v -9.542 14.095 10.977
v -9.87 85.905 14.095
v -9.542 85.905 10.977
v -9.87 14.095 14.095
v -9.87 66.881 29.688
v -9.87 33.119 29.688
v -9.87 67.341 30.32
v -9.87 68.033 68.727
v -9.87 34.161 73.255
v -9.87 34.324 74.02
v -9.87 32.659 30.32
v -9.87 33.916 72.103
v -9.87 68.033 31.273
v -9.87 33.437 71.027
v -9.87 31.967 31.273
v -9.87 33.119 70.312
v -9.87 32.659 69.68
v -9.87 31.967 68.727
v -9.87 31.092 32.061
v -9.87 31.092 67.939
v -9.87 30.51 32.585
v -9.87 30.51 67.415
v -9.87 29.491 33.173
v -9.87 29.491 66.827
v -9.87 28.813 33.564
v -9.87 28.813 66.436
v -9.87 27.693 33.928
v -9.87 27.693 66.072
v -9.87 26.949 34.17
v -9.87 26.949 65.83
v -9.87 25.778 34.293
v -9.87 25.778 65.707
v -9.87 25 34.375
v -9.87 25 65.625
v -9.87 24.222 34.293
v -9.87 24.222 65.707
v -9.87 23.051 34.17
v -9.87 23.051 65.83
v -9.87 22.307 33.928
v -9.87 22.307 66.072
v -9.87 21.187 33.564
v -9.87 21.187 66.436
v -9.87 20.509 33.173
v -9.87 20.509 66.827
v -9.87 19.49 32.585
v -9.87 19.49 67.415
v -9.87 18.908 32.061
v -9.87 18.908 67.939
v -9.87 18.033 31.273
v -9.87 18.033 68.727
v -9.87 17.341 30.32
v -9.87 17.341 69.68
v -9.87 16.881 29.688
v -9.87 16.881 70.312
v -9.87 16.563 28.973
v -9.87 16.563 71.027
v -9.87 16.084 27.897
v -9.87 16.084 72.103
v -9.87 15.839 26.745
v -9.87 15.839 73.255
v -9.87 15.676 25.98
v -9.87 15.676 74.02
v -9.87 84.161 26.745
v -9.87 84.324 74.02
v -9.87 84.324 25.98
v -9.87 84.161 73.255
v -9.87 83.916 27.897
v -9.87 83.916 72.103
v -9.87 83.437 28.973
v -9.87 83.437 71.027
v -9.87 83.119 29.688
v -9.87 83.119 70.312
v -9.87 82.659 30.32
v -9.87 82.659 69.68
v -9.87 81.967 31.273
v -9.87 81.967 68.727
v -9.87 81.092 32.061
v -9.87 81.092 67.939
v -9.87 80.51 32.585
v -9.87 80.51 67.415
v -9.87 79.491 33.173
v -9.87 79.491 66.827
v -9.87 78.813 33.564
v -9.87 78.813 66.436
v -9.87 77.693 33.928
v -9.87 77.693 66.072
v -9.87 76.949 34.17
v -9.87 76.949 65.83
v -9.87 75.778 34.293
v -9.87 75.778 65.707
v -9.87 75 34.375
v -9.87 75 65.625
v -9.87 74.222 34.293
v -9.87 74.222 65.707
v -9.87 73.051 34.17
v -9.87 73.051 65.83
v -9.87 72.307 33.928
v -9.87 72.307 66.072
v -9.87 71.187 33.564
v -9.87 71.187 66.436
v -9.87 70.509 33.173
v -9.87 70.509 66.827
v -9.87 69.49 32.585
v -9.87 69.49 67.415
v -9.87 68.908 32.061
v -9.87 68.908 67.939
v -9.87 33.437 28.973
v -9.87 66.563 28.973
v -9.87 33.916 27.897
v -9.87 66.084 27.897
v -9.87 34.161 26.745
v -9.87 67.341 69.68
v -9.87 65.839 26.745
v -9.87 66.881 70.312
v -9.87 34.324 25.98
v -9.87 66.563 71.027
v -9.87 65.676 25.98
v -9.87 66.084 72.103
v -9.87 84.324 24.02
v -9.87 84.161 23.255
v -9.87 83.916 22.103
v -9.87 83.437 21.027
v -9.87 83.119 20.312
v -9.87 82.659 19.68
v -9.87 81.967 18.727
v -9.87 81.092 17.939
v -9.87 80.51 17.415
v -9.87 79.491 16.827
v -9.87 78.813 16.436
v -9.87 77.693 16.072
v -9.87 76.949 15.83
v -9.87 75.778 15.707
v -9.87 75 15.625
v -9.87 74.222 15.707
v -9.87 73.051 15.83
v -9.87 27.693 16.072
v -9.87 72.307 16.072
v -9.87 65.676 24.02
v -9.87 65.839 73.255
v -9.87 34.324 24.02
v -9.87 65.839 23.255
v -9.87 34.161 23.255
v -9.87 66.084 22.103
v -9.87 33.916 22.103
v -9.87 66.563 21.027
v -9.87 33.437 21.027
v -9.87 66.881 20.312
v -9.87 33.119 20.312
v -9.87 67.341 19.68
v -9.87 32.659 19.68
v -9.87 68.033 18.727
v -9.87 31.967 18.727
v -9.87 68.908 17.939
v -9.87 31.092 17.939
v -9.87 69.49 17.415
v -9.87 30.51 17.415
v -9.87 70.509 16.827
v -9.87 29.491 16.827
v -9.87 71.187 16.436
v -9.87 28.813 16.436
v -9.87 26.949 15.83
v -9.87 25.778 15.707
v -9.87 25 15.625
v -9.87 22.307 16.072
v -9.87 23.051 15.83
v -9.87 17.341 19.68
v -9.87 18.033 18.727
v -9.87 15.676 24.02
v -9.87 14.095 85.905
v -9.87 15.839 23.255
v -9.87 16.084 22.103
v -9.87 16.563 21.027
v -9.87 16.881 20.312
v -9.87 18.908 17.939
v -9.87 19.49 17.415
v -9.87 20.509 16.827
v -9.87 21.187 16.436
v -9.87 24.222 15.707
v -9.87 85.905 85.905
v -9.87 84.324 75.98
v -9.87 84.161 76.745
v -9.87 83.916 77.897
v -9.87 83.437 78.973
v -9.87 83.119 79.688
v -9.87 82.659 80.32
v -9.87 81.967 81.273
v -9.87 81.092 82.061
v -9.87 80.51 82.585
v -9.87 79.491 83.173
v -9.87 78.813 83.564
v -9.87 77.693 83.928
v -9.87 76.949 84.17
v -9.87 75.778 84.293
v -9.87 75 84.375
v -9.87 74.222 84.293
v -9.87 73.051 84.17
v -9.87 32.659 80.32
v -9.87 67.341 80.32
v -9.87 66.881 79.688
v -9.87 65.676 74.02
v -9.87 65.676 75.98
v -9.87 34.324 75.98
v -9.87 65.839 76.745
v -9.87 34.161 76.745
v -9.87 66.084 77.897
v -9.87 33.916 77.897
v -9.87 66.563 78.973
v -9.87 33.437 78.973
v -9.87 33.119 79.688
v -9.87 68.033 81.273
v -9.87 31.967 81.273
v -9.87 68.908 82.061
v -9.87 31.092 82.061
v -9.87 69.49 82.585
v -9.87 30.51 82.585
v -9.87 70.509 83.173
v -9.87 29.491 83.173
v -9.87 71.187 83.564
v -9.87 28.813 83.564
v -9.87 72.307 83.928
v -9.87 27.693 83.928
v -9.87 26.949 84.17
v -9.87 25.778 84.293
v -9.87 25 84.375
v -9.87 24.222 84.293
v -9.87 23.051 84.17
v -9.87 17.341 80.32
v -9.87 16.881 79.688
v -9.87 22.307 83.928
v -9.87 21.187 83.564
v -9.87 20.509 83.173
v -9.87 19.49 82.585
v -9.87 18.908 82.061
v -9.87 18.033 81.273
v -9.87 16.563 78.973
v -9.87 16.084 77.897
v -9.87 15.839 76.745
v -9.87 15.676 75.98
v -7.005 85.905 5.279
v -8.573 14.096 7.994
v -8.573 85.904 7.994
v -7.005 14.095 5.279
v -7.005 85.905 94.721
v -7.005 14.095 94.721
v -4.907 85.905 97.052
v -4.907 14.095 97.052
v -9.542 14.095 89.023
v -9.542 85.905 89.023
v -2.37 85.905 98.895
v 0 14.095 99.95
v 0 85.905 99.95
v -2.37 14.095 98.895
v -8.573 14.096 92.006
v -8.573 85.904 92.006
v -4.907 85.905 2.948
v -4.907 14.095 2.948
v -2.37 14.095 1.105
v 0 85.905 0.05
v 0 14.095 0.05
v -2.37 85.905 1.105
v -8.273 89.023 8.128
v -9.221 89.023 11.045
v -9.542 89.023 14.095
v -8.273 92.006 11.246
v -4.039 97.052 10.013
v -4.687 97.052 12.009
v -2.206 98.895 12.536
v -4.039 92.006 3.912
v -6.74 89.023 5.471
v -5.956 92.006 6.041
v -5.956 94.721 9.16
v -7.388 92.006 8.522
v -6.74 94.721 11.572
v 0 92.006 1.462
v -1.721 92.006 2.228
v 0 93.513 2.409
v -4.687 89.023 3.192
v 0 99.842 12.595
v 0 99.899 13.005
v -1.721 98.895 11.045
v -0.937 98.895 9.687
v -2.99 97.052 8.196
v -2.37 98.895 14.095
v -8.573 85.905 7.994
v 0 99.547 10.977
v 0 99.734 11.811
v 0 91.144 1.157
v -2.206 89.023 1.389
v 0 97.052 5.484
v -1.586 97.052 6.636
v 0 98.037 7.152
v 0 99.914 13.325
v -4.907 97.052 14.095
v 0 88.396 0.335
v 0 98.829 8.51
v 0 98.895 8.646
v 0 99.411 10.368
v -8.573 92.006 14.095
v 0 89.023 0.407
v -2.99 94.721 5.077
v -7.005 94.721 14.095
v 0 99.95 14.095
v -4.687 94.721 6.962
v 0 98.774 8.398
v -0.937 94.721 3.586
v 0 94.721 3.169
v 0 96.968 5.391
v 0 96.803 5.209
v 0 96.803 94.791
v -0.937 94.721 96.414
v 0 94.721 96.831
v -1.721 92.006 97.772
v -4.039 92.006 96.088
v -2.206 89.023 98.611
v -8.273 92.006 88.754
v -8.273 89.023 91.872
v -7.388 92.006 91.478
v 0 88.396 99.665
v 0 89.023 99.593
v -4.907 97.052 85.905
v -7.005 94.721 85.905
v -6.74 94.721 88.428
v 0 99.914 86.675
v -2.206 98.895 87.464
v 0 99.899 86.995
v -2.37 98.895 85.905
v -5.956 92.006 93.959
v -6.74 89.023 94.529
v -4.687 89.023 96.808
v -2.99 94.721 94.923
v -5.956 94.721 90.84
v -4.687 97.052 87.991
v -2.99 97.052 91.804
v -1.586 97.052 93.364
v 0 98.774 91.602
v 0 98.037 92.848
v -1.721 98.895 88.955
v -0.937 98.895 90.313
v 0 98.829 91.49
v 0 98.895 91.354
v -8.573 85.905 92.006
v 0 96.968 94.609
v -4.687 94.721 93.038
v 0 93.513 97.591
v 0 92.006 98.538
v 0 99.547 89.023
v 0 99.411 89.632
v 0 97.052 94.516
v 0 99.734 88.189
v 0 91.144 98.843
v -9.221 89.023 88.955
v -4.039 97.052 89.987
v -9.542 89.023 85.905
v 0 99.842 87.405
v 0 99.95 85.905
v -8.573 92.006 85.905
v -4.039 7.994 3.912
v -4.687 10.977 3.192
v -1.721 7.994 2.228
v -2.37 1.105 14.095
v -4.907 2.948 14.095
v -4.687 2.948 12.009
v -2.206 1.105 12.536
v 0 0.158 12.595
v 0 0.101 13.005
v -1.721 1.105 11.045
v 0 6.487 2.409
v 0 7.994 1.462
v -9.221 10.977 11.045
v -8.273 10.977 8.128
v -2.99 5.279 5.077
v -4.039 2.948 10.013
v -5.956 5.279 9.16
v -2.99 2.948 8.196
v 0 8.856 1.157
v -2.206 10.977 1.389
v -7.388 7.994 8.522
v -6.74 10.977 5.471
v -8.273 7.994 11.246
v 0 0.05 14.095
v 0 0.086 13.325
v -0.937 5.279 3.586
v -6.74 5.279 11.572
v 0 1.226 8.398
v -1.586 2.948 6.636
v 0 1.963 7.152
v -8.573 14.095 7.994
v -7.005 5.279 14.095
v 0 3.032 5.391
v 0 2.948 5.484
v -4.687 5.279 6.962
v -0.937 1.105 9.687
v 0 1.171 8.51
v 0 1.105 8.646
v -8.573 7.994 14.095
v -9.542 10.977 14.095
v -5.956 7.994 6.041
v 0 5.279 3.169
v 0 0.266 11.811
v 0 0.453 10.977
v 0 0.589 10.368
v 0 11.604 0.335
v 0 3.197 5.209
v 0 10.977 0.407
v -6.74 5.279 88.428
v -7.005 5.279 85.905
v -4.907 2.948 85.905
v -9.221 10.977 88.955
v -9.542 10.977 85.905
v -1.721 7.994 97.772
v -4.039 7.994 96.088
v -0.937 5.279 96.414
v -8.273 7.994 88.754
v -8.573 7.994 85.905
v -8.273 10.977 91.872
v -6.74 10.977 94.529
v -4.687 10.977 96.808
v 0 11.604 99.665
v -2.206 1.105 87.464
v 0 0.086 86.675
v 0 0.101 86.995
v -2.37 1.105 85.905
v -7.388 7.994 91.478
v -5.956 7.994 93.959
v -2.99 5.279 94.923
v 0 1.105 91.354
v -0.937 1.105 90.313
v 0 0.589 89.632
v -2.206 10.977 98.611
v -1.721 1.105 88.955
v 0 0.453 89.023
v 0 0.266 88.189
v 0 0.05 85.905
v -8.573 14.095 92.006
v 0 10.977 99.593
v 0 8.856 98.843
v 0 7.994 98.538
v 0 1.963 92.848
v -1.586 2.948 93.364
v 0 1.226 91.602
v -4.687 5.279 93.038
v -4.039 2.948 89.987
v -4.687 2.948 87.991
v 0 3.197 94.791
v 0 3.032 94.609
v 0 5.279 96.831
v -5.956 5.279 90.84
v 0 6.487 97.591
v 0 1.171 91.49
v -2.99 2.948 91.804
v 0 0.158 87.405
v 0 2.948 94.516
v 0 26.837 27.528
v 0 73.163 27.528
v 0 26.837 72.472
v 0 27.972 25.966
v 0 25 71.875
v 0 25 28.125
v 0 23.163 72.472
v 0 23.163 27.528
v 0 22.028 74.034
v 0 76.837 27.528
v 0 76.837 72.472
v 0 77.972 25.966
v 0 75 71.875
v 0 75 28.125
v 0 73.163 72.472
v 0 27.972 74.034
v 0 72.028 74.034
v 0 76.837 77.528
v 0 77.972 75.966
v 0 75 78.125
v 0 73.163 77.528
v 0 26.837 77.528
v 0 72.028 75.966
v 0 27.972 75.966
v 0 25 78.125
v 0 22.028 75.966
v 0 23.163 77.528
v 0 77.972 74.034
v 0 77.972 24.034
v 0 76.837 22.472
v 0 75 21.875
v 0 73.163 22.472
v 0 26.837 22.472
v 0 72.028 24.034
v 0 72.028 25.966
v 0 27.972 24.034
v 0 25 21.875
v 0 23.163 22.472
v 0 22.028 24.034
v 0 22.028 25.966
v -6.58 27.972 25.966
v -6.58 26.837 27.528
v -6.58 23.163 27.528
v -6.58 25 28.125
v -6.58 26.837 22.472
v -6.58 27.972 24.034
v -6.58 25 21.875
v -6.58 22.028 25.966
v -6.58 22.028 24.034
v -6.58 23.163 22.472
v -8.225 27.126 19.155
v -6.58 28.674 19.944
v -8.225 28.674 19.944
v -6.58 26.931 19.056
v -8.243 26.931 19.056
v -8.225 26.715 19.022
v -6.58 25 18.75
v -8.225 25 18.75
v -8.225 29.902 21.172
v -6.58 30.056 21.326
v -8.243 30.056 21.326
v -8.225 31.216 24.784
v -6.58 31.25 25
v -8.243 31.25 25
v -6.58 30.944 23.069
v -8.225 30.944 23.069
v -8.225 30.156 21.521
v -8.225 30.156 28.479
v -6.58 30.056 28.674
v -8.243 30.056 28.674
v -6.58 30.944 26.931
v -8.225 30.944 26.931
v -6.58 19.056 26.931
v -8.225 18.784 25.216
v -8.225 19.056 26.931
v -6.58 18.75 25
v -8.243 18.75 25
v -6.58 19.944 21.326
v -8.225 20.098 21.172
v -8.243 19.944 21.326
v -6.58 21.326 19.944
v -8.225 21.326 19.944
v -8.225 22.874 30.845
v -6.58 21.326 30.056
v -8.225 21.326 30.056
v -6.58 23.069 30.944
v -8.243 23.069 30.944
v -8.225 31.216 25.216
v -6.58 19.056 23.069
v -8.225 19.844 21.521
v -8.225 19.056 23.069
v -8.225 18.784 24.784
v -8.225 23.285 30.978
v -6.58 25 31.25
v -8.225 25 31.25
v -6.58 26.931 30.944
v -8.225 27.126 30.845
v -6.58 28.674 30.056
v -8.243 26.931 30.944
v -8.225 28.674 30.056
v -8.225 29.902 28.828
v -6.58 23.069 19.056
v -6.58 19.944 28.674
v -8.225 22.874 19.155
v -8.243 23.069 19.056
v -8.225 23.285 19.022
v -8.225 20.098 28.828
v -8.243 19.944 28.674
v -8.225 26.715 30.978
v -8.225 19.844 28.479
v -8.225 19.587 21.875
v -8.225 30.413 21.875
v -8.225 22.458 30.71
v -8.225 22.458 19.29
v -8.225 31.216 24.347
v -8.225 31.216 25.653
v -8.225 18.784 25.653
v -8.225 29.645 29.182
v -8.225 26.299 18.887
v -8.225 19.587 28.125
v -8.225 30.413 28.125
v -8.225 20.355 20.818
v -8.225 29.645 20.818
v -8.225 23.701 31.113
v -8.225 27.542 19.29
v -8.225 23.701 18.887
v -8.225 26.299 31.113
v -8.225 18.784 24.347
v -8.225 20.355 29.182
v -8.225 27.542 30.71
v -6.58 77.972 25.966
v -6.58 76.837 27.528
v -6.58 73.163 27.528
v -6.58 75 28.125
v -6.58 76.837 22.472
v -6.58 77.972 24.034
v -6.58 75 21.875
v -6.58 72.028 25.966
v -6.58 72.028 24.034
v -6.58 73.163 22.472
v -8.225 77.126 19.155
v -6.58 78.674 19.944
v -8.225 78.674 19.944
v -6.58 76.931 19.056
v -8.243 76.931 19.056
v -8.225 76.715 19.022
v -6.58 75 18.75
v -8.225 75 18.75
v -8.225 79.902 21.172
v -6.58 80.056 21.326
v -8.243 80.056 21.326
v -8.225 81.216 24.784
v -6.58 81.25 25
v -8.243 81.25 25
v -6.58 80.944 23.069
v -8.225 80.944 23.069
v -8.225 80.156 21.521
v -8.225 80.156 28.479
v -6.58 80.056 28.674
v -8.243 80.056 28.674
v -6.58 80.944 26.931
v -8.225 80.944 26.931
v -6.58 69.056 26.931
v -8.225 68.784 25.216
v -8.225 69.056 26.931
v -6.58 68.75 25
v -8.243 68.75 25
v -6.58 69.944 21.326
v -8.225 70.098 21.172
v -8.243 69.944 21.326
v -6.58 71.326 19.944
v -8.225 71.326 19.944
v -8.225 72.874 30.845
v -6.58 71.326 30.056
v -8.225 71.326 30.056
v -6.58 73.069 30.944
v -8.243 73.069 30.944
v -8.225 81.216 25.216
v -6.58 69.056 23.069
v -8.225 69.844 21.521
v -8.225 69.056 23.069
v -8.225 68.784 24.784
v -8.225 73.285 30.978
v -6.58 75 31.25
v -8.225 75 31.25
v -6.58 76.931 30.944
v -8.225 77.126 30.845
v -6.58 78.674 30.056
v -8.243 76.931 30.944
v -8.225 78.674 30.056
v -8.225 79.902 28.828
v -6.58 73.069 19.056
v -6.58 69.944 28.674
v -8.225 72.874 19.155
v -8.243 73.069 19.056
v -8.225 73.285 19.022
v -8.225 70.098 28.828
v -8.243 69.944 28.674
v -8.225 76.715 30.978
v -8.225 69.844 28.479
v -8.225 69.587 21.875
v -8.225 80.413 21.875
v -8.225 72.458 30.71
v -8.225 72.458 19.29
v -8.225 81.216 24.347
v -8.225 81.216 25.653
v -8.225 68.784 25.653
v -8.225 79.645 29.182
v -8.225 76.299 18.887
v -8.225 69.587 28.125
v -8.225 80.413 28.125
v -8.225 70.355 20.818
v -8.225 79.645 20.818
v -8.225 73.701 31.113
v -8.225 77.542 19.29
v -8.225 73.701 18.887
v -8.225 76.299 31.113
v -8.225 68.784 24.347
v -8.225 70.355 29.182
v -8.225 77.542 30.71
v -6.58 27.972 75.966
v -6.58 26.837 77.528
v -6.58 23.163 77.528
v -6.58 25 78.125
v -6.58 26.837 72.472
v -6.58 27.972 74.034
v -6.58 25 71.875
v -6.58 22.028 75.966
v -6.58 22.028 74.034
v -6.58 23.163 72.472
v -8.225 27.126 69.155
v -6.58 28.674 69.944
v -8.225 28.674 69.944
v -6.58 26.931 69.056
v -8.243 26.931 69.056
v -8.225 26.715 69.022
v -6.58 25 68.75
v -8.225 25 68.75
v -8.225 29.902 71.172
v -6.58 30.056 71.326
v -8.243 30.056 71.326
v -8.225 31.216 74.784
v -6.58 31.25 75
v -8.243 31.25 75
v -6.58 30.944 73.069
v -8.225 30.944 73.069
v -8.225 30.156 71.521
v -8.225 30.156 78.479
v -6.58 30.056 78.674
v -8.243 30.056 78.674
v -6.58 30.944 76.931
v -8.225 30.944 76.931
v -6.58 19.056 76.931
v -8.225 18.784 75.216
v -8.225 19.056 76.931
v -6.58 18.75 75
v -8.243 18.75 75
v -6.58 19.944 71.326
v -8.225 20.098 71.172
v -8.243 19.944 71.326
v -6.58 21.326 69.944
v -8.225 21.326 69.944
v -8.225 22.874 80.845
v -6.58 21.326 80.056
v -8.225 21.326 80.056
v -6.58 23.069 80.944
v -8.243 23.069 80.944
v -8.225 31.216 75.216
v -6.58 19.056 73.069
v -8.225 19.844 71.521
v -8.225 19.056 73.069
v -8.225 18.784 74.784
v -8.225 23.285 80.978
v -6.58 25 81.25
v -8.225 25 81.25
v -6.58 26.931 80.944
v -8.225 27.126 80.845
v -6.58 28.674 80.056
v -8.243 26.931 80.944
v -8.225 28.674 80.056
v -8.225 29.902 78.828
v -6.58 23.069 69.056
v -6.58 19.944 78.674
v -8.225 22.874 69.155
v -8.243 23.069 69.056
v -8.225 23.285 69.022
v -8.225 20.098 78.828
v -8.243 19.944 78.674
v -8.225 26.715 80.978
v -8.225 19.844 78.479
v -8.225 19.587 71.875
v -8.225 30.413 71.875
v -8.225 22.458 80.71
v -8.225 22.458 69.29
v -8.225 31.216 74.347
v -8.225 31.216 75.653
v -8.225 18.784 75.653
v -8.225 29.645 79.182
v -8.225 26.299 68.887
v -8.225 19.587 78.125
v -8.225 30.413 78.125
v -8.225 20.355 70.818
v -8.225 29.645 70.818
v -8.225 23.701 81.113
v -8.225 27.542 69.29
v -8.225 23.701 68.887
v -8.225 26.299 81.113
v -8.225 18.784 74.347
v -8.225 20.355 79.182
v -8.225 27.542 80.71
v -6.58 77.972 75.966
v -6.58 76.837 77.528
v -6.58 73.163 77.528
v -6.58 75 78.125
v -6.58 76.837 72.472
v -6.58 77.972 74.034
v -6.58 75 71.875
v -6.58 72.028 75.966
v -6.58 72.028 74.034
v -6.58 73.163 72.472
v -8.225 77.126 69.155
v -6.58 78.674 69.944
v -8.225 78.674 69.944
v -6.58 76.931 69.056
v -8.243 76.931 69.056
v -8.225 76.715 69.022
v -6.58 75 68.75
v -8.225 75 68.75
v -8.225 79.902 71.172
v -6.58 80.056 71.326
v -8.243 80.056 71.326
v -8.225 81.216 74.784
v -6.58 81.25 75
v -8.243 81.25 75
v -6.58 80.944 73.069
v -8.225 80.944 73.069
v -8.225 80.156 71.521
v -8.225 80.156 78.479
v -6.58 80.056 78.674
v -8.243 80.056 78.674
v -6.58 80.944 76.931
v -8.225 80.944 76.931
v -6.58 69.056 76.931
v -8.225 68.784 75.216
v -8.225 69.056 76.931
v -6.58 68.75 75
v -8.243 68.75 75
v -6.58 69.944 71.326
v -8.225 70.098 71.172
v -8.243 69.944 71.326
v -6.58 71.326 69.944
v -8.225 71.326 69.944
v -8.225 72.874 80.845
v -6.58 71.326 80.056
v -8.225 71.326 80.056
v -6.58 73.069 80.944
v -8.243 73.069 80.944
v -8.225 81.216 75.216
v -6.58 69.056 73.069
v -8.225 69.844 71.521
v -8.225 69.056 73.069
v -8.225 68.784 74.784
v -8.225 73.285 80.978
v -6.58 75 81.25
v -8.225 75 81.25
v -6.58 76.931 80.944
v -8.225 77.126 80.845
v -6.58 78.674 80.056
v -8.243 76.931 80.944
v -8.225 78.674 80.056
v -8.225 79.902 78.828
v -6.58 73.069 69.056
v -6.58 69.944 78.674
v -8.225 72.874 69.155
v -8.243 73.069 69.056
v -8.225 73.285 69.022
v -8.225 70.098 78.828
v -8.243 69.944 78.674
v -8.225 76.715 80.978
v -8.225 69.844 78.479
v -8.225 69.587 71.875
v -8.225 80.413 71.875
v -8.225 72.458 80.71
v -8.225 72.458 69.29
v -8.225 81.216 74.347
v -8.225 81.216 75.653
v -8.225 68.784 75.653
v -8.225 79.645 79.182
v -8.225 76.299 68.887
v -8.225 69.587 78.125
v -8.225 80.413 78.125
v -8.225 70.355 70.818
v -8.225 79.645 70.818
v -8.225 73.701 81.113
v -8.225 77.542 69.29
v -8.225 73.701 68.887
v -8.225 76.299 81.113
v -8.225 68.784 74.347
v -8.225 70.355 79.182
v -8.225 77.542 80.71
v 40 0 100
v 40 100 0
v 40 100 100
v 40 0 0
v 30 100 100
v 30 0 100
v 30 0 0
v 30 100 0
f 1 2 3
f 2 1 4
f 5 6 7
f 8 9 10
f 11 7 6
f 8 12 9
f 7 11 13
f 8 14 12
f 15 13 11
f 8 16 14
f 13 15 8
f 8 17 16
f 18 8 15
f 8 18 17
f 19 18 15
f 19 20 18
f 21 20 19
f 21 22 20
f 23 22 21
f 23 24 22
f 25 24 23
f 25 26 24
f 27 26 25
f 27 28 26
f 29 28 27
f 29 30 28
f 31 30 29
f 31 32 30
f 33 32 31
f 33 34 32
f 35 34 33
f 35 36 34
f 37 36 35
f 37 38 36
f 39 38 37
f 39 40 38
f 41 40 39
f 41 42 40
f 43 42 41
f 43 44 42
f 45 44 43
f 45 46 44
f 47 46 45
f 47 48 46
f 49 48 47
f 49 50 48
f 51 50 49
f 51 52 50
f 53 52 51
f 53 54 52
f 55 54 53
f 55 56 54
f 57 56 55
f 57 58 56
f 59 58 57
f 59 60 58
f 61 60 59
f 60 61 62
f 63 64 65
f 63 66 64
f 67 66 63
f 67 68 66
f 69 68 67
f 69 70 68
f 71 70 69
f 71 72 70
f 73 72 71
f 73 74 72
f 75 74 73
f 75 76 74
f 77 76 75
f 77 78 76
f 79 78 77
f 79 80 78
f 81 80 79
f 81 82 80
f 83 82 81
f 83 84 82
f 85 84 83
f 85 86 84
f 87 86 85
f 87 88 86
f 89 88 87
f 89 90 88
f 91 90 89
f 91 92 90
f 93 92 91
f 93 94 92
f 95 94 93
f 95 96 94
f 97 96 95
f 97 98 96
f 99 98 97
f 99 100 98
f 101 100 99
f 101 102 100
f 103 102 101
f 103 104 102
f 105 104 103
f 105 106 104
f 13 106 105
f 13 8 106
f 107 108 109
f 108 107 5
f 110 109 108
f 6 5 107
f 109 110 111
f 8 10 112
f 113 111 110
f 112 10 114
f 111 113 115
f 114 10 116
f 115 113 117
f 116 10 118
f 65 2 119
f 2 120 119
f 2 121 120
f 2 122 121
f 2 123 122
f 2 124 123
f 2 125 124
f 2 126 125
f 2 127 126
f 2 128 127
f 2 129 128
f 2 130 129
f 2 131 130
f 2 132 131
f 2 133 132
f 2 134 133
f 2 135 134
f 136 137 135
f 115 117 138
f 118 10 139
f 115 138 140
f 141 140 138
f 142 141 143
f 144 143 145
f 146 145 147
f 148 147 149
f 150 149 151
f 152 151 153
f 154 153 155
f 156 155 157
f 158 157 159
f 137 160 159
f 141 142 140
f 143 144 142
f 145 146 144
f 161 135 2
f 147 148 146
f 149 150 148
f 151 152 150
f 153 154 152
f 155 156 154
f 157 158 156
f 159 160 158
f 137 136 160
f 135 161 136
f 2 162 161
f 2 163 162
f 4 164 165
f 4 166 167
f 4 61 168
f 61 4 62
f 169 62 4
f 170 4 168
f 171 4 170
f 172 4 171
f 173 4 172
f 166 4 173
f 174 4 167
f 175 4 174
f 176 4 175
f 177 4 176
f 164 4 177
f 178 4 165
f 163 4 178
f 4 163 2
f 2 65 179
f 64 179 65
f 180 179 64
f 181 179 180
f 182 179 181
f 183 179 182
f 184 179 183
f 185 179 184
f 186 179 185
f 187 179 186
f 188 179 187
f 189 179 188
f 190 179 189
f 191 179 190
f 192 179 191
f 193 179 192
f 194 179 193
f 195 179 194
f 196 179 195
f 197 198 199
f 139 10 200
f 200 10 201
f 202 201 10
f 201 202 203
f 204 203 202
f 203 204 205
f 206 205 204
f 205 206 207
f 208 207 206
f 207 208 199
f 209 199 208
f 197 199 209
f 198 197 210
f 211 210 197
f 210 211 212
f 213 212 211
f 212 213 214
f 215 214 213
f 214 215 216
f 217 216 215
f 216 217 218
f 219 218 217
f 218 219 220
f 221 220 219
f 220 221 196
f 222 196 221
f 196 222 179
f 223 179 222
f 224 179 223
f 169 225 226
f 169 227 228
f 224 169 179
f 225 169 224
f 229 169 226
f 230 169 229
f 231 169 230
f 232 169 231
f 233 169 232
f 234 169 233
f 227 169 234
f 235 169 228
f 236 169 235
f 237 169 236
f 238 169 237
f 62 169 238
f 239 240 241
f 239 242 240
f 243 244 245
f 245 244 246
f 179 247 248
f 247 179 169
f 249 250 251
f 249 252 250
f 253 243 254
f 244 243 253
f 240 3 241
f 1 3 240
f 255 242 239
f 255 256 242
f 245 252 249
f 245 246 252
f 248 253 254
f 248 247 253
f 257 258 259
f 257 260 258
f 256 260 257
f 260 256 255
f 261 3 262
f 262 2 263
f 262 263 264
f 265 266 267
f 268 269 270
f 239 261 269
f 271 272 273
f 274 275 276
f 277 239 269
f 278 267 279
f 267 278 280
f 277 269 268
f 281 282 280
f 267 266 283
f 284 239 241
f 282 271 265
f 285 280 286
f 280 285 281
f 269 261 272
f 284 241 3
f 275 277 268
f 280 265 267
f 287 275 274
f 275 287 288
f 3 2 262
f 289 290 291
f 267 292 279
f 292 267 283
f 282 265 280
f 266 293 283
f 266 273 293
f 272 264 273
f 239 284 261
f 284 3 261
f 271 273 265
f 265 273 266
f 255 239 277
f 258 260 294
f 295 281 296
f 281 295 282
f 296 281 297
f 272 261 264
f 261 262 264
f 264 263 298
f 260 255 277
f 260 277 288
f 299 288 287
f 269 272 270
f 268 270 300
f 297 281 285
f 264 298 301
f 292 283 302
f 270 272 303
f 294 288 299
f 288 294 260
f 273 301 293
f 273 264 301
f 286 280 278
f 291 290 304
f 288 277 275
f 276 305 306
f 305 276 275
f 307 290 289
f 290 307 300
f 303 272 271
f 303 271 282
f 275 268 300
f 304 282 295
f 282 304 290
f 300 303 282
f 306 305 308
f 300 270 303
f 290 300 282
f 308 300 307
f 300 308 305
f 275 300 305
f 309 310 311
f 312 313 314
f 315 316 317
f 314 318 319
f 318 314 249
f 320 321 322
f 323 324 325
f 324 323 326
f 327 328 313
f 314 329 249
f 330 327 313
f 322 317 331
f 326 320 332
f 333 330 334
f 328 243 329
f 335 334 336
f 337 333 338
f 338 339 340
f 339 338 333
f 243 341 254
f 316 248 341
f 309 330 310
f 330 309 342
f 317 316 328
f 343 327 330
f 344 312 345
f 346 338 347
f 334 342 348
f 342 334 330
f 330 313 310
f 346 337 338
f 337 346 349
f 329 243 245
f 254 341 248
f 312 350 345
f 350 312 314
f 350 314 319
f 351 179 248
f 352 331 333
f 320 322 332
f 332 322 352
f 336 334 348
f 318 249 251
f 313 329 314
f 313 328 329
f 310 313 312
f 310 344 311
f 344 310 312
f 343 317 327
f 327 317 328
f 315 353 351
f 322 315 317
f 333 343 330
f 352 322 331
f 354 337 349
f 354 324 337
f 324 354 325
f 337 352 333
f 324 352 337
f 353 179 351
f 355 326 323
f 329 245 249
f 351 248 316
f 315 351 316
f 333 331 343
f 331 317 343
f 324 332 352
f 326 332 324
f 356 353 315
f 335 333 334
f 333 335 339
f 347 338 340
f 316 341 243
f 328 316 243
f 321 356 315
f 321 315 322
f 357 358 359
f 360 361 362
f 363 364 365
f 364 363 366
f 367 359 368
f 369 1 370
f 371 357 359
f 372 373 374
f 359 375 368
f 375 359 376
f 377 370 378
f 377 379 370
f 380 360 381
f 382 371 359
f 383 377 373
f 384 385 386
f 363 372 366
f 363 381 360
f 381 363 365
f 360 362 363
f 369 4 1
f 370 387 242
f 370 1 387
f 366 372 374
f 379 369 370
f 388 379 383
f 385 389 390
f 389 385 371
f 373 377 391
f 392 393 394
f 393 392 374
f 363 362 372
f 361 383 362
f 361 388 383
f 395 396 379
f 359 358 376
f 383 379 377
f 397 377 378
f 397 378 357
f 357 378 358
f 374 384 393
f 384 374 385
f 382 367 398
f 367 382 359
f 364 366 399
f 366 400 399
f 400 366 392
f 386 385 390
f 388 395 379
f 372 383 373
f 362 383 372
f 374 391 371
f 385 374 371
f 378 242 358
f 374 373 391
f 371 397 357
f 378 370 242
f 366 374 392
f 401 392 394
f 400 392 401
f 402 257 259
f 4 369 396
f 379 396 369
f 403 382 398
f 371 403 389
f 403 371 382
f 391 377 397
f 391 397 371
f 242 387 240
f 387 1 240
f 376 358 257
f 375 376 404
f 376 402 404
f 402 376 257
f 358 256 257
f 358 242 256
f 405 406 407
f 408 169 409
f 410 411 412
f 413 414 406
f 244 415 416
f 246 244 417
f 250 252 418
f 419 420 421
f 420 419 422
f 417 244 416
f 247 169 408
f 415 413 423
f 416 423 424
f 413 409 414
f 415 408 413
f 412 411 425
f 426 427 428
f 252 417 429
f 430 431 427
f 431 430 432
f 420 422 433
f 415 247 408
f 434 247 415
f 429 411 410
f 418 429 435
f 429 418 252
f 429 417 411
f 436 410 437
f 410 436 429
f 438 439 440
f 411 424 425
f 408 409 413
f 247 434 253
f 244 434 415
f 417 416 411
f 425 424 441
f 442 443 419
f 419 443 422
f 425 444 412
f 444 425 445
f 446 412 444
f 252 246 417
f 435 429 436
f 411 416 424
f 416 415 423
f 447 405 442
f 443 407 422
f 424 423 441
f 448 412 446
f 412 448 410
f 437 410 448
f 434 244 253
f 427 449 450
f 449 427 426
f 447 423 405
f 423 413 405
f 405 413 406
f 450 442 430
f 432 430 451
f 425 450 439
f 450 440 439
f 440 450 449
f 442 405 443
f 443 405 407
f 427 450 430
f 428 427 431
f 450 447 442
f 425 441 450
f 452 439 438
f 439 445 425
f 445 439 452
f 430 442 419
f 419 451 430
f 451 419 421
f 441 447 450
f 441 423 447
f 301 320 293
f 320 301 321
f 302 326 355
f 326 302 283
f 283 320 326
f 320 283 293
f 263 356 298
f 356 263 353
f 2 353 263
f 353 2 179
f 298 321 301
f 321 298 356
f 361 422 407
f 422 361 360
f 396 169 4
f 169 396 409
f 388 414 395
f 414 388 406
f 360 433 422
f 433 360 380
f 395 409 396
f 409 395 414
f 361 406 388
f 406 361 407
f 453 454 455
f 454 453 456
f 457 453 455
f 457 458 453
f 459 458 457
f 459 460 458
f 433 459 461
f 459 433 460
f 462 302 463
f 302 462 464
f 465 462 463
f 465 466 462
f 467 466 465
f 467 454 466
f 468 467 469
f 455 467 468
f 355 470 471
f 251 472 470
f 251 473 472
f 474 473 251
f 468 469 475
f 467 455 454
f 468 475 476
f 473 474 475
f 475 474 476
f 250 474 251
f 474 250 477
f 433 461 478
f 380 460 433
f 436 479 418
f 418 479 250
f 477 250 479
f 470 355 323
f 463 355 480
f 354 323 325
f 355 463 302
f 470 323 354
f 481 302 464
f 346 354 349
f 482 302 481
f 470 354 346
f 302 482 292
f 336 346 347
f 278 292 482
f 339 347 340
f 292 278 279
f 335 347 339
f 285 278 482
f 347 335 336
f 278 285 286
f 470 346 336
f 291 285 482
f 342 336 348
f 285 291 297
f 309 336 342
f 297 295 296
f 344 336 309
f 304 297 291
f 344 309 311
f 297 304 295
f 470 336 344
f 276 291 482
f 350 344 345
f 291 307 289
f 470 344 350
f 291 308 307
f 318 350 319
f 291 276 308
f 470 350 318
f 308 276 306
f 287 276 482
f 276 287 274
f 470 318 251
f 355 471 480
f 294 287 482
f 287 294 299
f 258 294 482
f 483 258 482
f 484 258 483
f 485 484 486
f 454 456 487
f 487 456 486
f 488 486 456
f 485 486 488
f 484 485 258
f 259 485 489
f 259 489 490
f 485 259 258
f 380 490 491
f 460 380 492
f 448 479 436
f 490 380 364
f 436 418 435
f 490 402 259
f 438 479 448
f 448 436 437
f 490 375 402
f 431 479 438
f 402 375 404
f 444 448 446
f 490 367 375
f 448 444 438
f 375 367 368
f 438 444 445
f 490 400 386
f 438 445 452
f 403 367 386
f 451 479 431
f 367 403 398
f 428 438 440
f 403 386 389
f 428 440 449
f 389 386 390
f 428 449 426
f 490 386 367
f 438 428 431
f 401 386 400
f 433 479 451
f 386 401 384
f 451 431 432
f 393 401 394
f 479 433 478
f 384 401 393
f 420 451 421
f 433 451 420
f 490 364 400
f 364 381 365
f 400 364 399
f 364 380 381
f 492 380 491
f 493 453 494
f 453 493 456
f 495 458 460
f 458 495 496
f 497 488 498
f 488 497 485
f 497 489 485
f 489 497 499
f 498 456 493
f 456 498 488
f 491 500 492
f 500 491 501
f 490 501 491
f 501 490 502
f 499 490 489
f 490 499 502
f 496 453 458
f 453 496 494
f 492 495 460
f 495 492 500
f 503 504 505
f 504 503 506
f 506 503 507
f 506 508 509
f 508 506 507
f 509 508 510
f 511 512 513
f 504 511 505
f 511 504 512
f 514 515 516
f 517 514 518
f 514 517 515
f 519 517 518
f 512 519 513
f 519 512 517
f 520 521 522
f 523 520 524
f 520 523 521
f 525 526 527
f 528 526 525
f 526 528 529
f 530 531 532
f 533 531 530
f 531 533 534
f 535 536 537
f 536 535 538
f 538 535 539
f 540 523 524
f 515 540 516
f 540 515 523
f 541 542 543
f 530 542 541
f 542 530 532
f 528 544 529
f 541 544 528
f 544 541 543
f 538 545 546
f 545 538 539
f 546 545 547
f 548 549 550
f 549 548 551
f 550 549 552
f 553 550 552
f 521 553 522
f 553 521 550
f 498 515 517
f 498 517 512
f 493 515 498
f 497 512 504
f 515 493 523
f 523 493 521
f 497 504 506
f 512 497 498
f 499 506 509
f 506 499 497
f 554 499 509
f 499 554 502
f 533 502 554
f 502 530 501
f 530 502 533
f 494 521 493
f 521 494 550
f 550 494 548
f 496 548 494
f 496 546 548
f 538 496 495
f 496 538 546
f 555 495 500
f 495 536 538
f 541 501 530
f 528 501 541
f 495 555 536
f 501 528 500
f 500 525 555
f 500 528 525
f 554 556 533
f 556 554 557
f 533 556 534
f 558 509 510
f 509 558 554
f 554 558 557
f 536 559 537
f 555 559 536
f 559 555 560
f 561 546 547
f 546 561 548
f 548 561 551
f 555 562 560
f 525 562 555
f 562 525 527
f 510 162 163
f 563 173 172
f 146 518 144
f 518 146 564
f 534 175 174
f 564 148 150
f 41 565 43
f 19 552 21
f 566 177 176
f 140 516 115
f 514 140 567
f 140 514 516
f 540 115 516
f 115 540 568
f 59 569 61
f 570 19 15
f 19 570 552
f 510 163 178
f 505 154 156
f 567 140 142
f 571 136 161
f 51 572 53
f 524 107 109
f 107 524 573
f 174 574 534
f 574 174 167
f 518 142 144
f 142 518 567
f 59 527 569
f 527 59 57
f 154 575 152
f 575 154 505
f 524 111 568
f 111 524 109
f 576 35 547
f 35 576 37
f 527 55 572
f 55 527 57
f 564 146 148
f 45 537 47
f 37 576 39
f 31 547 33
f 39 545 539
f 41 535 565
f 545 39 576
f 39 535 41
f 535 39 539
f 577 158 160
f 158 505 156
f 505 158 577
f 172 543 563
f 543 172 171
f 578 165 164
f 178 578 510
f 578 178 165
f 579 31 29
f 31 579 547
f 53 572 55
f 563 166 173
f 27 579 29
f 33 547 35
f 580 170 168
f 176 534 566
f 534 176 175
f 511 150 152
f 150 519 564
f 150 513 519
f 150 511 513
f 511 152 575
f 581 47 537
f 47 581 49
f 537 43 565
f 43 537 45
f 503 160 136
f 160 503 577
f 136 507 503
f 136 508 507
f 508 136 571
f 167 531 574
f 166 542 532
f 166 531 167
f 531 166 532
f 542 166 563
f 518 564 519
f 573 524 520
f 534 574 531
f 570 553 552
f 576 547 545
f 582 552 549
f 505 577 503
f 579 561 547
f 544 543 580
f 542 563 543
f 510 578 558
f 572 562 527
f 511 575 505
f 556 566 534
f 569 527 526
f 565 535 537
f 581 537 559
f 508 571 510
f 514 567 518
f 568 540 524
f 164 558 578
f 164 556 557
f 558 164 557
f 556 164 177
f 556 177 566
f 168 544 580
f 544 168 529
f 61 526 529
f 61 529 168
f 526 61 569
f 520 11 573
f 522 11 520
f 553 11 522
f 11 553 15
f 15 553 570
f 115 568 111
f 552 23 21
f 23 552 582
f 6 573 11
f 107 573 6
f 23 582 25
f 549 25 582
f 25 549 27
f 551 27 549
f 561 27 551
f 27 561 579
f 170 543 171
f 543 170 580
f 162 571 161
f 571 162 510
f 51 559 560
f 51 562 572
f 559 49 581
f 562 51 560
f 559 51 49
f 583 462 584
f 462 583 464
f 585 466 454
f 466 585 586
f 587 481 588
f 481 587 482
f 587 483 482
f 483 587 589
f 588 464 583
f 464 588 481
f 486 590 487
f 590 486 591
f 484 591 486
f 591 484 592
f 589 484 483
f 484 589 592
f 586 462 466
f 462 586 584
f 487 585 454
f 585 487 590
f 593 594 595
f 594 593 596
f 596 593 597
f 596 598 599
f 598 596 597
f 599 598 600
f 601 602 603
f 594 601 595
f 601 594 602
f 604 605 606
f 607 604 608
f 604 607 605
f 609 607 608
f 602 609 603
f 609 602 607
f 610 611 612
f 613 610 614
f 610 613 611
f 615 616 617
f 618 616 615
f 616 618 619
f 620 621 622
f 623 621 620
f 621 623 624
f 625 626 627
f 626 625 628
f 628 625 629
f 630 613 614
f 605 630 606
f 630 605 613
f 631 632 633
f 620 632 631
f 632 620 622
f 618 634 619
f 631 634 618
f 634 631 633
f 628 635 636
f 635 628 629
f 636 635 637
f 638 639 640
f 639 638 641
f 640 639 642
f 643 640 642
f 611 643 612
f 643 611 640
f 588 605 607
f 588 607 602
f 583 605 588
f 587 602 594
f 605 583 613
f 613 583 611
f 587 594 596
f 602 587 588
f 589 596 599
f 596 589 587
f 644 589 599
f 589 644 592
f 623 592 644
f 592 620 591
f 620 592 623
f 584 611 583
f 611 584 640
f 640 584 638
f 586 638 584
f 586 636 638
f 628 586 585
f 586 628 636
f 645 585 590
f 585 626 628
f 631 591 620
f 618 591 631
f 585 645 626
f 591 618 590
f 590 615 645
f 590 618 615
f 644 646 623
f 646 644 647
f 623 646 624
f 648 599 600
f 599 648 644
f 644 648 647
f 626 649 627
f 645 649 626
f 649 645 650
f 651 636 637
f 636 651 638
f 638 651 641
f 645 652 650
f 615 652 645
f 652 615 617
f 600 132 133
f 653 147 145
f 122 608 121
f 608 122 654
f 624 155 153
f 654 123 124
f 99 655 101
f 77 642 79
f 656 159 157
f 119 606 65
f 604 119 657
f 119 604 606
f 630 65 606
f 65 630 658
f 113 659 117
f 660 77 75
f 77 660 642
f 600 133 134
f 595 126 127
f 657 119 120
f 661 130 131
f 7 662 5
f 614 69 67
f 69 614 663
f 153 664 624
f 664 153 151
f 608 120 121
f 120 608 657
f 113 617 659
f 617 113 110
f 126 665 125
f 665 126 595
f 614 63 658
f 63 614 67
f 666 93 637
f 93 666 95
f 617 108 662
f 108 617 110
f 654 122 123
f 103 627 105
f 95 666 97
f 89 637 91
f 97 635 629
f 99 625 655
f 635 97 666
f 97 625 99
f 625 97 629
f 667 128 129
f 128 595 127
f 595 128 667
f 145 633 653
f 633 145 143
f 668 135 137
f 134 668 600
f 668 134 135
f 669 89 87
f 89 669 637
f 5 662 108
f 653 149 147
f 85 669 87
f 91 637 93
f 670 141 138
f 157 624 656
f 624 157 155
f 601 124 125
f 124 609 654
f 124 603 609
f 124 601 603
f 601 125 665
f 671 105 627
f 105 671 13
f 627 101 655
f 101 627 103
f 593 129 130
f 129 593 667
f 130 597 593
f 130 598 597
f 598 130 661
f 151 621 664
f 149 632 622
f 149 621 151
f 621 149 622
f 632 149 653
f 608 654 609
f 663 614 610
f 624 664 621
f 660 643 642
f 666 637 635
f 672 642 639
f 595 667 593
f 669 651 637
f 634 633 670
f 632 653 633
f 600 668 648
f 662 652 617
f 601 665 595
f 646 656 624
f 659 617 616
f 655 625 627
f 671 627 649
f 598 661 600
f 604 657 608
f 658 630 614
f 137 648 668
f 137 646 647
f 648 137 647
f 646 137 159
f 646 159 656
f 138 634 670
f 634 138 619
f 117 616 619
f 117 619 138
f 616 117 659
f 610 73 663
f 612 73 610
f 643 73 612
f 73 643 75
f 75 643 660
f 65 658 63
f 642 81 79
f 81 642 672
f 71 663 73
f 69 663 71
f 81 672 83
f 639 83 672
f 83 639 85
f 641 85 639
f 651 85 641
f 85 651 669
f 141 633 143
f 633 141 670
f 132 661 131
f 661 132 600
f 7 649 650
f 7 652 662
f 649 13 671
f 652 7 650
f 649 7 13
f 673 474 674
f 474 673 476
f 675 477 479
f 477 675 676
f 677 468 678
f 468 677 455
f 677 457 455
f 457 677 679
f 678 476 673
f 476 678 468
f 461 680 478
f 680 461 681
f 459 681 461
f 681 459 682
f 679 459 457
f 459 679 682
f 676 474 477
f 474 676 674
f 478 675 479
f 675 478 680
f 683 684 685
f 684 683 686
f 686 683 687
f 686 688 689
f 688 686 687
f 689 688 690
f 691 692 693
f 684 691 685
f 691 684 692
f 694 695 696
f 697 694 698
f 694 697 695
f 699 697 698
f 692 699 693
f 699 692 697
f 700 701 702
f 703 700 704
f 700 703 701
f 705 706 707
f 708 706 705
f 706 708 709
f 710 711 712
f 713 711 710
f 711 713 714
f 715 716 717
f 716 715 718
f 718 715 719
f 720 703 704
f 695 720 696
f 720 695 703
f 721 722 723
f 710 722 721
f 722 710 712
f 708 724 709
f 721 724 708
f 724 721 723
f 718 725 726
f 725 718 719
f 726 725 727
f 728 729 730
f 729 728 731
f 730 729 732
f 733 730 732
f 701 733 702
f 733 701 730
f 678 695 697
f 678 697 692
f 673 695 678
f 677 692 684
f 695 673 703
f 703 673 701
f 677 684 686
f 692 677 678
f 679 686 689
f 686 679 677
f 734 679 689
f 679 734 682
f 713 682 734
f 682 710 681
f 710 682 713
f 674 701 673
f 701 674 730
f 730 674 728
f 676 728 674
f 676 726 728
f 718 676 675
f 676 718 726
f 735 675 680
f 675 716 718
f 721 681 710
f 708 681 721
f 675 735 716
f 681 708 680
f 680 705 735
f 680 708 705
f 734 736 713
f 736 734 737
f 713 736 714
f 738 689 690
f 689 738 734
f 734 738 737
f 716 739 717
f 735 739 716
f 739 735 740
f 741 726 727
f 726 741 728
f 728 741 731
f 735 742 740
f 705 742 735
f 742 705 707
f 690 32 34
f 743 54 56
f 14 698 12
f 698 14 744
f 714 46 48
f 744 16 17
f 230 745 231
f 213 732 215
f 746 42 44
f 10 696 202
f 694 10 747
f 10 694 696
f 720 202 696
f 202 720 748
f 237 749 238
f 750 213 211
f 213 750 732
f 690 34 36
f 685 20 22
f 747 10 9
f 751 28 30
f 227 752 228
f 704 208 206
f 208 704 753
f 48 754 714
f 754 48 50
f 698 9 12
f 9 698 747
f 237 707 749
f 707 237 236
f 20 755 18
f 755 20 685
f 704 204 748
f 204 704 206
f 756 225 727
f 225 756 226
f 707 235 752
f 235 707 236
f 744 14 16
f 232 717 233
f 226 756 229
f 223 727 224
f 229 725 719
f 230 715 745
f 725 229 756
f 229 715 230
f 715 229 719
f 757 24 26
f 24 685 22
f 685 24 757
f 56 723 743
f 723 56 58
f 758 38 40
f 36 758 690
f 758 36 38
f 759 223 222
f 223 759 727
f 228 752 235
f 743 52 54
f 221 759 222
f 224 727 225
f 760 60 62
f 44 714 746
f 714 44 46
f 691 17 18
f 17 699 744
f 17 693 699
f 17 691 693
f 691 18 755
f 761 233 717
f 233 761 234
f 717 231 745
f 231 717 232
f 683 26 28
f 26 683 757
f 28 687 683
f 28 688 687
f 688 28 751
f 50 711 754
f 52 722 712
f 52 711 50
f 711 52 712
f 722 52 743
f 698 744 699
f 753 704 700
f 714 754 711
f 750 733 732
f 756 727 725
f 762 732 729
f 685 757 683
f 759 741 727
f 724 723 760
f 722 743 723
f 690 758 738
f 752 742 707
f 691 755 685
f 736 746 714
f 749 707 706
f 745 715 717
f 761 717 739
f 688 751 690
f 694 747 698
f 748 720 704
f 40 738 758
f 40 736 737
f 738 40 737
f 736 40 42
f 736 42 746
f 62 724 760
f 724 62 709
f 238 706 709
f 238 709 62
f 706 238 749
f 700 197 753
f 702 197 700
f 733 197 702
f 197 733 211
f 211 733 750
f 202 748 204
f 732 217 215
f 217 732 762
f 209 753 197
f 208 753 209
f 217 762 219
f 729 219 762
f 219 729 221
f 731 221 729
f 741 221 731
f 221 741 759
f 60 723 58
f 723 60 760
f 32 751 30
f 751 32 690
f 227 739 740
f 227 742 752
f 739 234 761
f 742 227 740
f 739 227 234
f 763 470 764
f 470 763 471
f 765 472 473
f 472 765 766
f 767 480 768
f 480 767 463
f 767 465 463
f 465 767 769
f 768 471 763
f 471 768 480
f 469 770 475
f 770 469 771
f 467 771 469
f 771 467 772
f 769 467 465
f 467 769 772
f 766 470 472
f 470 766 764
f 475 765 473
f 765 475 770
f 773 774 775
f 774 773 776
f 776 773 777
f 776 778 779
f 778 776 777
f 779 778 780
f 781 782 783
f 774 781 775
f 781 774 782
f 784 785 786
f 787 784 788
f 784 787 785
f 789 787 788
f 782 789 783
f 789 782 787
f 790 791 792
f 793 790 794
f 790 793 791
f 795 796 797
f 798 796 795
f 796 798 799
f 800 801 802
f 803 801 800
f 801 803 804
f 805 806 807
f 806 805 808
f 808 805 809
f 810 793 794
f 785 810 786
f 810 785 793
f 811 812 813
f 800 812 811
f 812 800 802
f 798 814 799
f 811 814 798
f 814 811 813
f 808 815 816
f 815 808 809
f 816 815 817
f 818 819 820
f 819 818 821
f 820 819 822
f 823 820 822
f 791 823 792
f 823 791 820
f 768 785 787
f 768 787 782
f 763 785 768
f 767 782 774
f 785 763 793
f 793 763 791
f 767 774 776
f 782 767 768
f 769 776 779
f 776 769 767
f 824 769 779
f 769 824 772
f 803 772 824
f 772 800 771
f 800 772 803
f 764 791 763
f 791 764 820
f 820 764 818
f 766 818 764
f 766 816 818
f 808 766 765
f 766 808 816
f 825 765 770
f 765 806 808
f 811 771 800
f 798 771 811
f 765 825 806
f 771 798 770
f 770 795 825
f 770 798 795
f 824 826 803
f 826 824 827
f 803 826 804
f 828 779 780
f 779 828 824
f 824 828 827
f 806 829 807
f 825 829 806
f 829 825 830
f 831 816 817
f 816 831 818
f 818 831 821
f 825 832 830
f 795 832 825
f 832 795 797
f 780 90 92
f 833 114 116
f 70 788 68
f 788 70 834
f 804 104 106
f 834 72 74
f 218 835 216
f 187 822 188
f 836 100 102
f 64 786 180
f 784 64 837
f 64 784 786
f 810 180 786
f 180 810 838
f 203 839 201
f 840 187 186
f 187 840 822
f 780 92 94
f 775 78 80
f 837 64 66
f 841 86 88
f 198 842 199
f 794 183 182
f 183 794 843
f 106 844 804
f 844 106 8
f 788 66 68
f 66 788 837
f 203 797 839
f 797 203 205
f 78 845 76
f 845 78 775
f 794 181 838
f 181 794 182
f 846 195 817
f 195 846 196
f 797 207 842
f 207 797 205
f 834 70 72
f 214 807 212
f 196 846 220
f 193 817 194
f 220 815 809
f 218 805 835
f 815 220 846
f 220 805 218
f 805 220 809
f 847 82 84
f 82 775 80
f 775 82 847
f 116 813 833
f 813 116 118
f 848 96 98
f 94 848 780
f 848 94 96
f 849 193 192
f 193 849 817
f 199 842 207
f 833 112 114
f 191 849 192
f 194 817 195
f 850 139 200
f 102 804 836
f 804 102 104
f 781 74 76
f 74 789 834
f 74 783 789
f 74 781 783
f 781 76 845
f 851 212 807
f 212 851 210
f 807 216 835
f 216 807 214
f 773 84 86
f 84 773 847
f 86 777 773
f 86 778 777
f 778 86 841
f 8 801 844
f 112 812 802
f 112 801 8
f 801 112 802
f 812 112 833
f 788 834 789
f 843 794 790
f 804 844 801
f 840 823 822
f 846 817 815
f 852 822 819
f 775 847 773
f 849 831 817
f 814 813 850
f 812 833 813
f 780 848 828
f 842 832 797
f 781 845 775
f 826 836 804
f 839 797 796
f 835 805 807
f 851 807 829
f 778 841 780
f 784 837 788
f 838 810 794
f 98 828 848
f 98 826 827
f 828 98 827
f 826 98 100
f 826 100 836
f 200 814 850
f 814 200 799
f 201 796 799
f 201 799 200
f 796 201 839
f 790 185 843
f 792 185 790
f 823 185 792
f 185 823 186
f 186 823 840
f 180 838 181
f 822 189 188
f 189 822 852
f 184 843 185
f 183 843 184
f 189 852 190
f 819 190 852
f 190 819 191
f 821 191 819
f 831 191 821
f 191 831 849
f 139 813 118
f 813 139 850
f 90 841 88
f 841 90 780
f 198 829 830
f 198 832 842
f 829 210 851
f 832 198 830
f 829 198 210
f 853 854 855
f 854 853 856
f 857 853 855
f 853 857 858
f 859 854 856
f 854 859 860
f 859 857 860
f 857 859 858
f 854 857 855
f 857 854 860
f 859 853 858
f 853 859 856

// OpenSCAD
//
//  Copyright (C) 15-2-2013 Jasper den Ouden.
//
//  This is free software: you can redistribute it and/or modify
//  it under the terms of the GNU General Public License as published
//  by the Free Software Foundation, either version 3 of the License, or
//  (at your option) any later version.
//

// Rounded plate, for instance for reinforcement on other side if the wall is thin.

h = 100;
w = 2*50;

//TODO feh doesnt seem easily solvable to get some angle _and_ some thickness at same time.
//t = 15;

r = 15; //Rounding radius.

corner_d = w/4;

a = 70; //Angle the sides 'hit' the end.

ox = r*cos(a);
oy = r*sin(a);

t= r - ox;

hole_r = w/32;
head_r = w/16; //Radius of screw(or whatever) head.
head_d = t/3; //Depth of embedding.
head_dr = w/32;
head_dz = t/6;

module rounded_plate_unsubstracted()
{   
    translate([0,w]) rotate(v=[1,0,0], a=90) 
    {   linear_extrude(height=w-2*oy)
        {   circle(r);
            translate([0,h/2-oy]) square([2*r,h-2*oy], center=true);
            translate([0,h-2*oy]) circle(r);
        }
        sphere(r);
        translate([0,h-2*oy]) sphere(r);
        translate([0,0,w-2*oy]) sphere(r);
        translate([0,h-2*oy,w-2*oy]) sphere(r);
    }
    translate([0,w]) cylinder(h=h-2*oy, r=r);
    translate([0,2*oy]) cylinder(h=h-2*oy, r=r);
}

module substract_hole() //TODO use the nut_hole file.
{   rotate(v=[0,1,0], a=90) 
    { cylinder(r= hole_r, h = 4*r);
      cylinder(r=head_r, h=r+head_d);
      cylinder(r1=head_r + head_dr*(r + head_dz)/head_dz, r2=head_r, 
               h= r+head_dz);
    }
}
module rounded_plate()
{
    difference()
    {   translate([0,-r,oy]) difference() 
        {   translate([ox,r - oy]) rounded_plate_unsubstracted();
            translate([r,w/2,h/2]) cube(2*[r,2*w,h], center=true);
        }
        translate([ox-2*r,corner_d,corner_d]) substract_hole();
        translate([ox-2*r,w-corner_d,corner_d]) substract_hole();

        translate([ox-2*r,corner_d,h-corner_d]) substract_hole();
        translate([ox-2*r,w-corner_d,h-corner_d]) substract_hole();
    }
}

rounded_plate();
color([0,0,1]) translate([30,0]) cube([10,w,h]);
